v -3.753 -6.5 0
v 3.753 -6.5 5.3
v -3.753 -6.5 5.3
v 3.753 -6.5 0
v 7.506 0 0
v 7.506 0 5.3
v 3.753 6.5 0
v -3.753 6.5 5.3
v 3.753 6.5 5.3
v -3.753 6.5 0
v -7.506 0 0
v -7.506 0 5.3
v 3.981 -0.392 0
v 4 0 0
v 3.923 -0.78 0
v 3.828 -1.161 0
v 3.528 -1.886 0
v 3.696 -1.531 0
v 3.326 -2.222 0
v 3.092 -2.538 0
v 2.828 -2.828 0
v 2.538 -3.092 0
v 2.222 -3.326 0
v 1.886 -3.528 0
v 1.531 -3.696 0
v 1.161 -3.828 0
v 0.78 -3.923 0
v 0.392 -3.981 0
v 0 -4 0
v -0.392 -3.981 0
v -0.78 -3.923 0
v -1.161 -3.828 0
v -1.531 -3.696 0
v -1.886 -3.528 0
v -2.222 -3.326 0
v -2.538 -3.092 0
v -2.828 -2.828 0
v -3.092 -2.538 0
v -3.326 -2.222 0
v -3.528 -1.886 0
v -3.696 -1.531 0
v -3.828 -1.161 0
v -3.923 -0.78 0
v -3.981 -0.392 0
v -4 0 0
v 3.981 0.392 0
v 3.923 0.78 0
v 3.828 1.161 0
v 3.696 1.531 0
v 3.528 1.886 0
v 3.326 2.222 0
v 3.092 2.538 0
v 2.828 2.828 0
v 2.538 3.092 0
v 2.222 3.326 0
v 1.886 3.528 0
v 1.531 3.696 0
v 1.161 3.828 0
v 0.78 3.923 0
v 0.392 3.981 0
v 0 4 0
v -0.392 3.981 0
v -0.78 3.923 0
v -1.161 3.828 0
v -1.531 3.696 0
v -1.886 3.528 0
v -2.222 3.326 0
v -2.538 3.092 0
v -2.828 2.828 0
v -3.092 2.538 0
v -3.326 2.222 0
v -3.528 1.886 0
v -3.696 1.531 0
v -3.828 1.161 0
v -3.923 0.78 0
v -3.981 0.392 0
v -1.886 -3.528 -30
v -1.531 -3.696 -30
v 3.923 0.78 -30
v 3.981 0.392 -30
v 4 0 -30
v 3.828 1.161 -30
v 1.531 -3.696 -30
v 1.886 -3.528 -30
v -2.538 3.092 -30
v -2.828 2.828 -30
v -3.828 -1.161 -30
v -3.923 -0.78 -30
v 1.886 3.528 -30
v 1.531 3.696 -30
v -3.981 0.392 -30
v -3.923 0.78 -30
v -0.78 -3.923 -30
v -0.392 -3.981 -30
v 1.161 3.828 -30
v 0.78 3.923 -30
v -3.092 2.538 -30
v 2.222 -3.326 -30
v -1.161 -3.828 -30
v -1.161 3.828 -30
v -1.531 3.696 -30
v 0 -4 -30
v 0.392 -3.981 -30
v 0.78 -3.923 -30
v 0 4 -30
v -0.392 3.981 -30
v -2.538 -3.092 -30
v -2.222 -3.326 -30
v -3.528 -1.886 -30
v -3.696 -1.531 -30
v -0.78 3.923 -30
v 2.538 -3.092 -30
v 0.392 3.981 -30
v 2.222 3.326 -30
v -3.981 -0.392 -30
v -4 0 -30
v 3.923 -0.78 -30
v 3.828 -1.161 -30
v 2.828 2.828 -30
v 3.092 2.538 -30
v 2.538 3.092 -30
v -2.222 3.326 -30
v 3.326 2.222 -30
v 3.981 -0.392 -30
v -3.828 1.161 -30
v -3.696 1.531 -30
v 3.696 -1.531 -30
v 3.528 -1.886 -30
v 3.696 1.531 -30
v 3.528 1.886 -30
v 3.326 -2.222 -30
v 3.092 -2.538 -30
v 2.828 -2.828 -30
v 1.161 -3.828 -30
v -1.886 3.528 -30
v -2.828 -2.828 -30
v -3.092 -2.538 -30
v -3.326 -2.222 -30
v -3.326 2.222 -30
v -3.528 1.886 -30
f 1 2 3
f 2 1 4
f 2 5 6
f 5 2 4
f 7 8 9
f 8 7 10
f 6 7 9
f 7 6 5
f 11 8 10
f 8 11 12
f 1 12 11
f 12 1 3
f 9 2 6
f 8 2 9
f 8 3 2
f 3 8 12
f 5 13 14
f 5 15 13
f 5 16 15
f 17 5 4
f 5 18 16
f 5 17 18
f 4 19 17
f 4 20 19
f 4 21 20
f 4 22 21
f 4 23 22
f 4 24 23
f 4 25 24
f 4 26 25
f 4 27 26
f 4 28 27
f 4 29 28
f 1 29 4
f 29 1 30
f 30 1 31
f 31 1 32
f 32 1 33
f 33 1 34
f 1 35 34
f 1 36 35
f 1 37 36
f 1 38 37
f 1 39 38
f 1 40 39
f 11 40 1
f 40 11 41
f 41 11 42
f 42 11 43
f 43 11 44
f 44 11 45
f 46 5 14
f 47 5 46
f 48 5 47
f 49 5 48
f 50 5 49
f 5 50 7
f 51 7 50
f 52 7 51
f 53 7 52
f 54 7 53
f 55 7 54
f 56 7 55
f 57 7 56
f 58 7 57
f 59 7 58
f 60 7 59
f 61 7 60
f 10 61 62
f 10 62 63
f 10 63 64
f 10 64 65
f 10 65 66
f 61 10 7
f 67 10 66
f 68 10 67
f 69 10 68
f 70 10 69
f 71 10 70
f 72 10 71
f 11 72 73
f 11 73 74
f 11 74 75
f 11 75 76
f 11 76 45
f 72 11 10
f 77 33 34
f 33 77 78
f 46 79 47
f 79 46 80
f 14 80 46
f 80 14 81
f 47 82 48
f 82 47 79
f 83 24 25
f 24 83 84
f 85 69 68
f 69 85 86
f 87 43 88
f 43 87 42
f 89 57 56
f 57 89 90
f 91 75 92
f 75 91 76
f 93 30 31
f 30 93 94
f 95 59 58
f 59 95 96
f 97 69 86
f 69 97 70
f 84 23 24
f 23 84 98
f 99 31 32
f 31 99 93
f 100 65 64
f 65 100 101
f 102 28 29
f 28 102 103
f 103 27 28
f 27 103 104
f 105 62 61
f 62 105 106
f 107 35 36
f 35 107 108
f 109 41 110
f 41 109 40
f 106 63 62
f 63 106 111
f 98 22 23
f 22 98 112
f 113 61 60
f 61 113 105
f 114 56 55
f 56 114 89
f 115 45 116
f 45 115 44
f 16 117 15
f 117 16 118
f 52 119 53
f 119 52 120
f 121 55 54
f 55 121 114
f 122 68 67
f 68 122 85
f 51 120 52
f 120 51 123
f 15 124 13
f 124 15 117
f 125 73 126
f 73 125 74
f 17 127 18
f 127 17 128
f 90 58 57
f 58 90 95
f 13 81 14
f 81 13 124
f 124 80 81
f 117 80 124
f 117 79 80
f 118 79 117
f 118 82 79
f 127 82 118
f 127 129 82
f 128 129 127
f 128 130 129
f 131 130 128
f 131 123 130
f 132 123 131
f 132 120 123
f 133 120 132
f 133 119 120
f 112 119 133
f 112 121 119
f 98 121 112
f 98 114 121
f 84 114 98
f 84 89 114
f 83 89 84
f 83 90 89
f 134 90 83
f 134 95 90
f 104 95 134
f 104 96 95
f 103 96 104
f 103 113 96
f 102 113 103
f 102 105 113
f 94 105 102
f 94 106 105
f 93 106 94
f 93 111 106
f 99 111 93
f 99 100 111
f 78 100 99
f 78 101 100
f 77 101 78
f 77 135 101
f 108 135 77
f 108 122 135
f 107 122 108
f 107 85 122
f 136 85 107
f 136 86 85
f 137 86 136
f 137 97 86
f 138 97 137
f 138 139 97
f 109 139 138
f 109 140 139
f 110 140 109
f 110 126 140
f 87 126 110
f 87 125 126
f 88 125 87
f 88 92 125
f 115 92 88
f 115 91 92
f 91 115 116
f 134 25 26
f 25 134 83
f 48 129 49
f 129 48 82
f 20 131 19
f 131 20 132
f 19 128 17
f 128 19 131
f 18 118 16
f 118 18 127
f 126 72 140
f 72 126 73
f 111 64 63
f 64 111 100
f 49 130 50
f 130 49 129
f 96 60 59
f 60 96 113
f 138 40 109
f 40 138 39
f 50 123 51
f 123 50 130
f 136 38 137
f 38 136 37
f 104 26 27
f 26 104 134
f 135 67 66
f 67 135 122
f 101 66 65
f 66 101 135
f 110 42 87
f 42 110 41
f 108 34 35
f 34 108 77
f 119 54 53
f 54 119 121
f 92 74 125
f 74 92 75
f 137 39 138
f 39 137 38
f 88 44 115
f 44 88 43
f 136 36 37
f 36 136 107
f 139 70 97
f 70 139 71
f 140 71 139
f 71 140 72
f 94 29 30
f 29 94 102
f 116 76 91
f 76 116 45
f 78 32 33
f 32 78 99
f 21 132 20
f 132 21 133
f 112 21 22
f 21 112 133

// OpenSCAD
// M8 Hex Bolt (Simplified model)
$fn = 64;

// 頭部: 六角柱 (Across-flats 13mm, Height 5.3mm)
// OpenSCADのcylinder($fn=6)において d は対角距離になるため、
// 対辺距離を13mmにするには 13/cos(30) を直径に指定します。
cylinder(h = 5.3, d = 13 / cos(30), $fn = 6);

// シャンク: 円柱 (Diameter 8mm, Length 30mm)
// z=0 から負の方向 (-30) へ伸ばします。
translate([0, 0, -30])
    cylinder(h = 30, d = 8);
